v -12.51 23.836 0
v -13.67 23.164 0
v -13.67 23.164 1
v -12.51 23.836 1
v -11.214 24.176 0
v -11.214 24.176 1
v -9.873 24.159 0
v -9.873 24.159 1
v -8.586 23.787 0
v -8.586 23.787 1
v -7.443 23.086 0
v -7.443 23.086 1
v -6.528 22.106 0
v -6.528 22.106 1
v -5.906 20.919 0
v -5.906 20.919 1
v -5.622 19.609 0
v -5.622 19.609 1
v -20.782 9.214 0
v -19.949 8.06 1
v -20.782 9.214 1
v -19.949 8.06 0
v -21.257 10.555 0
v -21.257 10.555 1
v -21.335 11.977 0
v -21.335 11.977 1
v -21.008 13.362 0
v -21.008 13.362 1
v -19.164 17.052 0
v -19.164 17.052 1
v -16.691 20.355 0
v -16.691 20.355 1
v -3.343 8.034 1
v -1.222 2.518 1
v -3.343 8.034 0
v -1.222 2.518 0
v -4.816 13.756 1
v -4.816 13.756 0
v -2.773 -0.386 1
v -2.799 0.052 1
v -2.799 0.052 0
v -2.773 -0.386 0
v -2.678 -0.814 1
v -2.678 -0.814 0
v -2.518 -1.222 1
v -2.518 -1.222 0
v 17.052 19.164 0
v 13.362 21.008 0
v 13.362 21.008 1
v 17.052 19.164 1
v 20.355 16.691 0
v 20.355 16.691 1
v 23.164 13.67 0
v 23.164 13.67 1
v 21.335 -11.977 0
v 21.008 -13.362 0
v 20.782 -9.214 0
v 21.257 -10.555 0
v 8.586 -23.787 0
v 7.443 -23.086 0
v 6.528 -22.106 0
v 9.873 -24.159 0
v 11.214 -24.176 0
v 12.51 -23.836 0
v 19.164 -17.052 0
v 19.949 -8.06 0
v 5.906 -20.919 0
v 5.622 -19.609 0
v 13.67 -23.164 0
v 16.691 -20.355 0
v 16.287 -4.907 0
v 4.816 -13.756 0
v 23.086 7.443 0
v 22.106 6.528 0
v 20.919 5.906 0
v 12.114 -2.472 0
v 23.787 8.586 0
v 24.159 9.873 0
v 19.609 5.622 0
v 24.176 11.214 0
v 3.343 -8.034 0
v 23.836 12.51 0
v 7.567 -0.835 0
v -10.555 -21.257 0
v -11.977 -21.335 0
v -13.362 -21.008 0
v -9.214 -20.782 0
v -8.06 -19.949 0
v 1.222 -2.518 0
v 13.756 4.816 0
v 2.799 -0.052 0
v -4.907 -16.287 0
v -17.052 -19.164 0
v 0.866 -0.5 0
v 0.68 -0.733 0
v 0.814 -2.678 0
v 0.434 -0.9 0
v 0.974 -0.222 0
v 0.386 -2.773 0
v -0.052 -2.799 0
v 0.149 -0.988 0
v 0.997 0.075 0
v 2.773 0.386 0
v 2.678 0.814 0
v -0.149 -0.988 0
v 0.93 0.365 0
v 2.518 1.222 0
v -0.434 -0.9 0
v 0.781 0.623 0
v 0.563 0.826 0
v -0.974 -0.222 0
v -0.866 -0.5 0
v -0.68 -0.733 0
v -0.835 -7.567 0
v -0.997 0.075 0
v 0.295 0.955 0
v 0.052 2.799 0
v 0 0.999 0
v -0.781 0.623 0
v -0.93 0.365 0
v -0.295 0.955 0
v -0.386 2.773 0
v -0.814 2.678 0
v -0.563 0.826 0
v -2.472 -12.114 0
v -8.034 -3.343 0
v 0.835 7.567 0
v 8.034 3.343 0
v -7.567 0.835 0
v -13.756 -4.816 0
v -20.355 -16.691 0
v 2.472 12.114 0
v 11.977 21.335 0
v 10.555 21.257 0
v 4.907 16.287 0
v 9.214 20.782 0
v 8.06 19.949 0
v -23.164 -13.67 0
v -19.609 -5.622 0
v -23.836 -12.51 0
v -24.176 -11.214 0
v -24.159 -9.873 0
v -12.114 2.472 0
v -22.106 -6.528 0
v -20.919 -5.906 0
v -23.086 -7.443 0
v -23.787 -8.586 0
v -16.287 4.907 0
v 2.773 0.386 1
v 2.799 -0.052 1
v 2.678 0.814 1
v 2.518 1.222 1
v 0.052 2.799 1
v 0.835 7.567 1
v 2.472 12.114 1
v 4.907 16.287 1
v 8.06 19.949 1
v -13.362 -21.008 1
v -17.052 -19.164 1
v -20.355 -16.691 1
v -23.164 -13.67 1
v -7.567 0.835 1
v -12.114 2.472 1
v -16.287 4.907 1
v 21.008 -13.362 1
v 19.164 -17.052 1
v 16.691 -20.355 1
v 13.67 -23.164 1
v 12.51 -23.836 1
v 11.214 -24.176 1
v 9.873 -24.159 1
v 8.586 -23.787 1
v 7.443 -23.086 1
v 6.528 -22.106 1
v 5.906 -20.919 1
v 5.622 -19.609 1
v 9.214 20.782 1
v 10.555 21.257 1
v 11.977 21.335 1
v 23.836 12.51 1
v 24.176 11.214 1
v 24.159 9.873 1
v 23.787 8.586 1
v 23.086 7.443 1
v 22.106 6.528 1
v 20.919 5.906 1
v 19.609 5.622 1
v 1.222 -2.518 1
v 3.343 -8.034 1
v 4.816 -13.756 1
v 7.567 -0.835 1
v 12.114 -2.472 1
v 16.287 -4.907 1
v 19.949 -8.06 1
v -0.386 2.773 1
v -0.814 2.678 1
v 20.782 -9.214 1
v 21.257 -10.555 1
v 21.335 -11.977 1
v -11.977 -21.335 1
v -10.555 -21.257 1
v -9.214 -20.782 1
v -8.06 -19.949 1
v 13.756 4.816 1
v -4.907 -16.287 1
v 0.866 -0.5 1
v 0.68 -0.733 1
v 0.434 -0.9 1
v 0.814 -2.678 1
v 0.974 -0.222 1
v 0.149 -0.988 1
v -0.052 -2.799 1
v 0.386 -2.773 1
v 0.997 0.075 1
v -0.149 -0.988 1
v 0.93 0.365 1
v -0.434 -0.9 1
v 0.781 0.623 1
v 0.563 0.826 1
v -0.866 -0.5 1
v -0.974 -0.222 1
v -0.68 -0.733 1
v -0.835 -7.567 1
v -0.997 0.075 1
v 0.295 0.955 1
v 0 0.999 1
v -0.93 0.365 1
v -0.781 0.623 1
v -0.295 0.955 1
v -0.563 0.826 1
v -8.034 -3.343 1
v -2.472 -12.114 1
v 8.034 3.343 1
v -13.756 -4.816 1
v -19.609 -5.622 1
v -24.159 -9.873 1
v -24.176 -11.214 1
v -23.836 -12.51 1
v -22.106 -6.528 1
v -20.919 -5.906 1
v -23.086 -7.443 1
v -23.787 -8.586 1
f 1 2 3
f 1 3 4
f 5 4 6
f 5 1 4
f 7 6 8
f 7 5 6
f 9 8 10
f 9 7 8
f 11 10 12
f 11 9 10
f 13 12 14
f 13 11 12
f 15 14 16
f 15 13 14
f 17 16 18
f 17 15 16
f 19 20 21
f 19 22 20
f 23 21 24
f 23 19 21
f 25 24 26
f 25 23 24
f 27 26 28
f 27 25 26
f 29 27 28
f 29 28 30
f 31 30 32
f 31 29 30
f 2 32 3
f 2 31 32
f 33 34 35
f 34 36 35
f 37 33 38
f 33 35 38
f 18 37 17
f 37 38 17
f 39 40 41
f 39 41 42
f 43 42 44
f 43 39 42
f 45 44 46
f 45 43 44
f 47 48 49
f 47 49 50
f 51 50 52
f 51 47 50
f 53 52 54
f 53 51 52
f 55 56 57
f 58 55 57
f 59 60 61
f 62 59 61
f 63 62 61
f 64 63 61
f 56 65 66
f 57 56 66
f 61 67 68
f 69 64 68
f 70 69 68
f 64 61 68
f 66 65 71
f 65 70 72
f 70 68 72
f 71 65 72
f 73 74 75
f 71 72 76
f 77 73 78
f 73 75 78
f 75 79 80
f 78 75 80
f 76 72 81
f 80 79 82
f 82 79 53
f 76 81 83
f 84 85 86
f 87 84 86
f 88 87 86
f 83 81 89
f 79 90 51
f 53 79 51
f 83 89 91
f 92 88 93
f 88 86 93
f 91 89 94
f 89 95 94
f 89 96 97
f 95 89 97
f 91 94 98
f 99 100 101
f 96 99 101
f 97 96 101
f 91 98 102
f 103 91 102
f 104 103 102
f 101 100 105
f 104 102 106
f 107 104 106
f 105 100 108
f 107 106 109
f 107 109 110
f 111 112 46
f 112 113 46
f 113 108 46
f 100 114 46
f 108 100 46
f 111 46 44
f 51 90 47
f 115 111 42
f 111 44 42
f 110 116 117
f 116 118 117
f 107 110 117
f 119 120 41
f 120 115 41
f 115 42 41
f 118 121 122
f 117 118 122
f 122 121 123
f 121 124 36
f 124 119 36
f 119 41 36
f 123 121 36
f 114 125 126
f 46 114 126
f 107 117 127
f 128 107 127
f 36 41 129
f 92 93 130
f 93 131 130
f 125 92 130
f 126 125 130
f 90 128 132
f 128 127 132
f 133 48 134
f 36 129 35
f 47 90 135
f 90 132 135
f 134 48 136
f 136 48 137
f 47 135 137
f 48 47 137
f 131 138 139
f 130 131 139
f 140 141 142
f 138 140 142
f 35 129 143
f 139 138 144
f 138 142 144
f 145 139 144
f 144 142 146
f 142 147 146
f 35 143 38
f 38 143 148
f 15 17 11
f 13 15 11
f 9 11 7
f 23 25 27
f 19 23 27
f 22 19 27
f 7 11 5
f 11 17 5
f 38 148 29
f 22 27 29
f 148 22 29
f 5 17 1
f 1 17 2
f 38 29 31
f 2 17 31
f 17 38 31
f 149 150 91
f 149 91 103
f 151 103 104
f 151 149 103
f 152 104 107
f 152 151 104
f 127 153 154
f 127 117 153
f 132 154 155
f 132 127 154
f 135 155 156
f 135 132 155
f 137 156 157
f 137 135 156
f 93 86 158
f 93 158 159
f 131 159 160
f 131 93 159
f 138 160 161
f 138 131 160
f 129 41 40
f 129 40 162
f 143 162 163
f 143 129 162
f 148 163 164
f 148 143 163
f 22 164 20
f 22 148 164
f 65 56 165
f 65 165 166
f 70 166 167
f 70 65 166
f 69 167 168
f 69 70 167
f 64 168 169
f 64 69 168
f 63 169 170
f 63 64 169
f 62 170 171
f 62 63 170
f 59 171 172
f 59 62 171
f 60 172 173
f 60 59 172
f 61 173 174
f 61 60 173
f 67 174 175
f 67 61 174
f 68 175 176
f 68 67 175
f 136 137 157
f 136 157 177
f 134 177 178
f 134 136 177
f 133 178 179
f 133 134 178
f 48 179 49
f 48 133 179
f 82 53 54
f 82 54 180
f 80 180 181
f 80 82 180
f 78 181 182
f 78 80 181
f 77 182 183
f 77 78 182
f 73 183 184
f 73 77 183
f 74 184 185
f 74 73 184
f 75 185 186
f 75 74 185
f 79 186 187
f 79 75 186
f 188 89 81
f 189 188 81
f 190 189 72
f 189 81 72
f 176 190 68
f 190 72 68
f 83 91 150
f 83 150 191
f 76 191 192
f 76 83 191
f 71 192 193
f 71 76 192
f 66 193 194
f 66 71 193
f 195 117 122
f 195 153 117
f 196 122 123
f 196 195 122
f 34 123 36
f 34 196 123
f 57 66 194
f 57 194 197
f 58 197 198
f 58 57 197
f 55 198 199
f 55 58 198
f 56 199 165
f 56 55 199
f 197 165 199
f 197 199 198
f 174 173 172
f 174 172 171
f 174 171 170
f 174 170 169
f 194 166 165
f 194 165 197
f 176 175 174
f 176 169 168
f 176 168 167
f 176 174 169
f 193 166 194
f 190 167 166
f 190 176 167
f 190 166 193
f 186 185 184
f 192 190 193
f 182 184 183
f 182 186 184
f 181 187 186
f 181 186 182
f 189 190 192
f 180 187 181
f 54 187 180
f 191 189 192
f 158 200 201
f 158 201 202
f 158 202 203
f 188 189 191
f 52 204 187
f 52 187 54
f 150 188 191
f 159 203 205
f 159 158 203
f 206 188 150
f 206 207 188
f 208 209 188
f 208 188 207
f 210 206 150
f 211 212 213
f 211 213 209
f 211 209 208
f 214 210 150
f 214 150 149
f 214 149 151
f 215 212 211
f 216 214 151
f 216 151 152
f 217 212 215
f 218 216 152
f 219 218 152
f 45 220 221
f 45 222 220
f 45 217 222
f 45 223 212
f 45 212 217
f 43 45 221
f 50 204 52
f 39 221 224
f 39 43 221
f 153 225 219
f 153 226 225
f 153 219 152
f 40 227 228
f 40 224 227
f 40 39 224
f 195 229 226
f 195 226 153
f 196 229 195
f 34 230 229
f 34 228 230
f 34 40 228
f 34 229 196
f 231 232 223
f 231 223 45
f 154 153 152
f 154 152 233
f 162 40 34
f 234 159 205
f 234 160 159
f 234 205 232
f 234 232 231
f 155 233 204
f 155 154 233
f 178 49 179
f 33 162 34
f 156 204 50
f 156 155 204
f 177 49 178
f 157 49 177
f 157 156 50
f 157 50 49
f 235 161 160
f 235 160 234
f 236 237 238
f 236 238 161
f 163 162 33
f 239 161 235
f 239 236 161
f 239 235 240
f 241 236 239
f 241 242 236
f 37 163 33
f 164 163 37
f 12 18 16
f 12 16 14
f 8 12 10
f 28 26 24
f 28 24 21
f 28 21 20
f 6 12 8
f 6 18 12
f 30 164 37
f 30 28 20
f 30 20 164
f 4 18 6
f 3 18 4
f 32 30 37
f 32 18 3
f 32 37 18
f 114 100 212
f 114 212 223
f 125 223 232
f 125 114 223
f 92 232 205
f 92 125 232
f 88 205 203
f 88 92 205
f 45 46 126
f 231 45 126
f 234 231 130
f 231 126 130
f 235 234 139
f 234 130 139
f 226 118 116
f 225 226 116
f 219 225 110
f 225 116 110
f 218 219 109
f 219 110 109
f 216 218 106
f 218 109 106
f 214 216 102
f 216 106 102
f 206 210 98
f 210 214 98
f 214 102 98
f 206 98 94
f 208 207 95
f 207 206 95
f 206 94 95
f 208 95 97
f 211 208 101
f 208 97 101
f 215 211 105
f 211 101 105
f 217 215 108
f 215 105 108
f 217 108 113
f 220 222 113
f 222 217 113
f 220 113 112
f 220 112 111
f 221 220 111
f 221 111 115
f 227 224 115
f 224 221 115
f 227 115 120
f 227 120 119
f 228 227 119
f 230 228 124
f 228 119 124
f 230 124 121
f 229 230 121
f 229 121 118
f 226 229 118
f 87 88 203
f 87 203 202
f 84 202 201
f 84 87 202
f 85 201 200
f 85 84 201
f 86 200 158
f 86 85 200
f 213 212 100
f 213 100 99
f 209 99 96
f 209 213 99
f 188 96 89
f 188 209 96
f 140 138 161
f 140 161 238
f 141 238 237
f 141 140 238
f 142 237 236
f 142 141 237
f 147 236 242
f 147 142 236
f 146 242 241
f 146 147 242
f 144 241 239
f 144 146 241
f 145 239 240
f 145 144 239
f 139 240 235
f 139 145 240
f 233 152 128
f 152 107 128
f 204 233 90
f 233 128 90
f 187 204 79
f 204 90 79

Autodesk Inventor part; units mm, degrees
ref_plane "YZ Plane" through (0, 0, 0) normal (1, 0, 0) x (0, 1, 0)
ref_plane "XZ Plane" through (0, 0, 0) normal (0, 1, 0) x (-1, 0, 0)
ref_plane "XY Plane" through (0, 0, 0) normal (0, 0, 1) x (1, 0, 0)
sketch "Sketch1" plane through (0, 0, 0) normal (0, 0, 1) x (1, 0, 0)
  circle A0 centre (0, 0) radius 28
  circle A1 centre (0, 0) radius 1.8
  arc A2 (23.4652, 15.2769) -> (5.1796, 27.5168) centre (0, 0) ccw
  arc A3 (1.1742, 1.3642) -> (0.0115, 1.8) centre (0, 0) ccw
  arc A4 (1.3642, -1.1742) -> (1.8, -0.0115) centre (0, 0) ccw
  arc A5 (-1.3642, 1.1742) -> (-1.8, 0.0115) centre (0, 0) ccw
  arc A6 (-1.1742, -1.3642) -> (-0.0115, -1.8) centre (0, 0) ccw
  arc A7 (8.0598, 19.9487) -> (-0.0006, 1.8) centre (26.4682, 0.9087) ccw
  arc A8 (23.1644, 13.6701) -> (13.3624, 21.0083) centre (4.9305, -0.4702) ccw
  arc A9 (19.6092, 5.6217) -> (1.6116, 0.8017) centre (23.6763, -45.5755) ccw
  arc A10 (1.6116, 0.8017) -> (-0.0006, 1.8) centre (0, 0) ccw
  arc A11 (13.3624, 21.0083) -> (8.0598, 19.9487) centre (11.5352, 16.3541) ccw
  arc A12 (19.6092, 5.6217) -> (23.1644, 13.6701) centre (19.2133, 10.606) ccw
  arc A13 (19.9487, -8.0598) -> (1.8, 0.0006) centre (0.9087, -26.4682) ccw
  arc A14 (13.6701, -23.1644) -> (21.0083, -13.3624) centre (-0.4702, -4.9305) ccw
  arc A15 (5.6217, -19.6092) -> (0.8017, -1.6116) centre (-45.5755, -23.6763) ccw
  arc A16 (0.8017, -1.6116) -> (1.8, 0.0006) centre (0, 0) ccw
  arc A17 (21.0083, -13.3624) -> (19.9487, -8.0598) centre (16.3541, -11.5352) ccw
  arc A18 (5.6217, -19.6092) -> (13.6701, -23.1644) centre (10.606, -19.2133) ccw
  arc A19 (-1.1742, -1.3642) -> (-0.0115, -1.8) centre (0, 0) ccw
  arc A20 (-8.0598, -19.9487) -> (0.0006, -1.8) centre (-26.4682, -0.9087) ccw
  arc A21 (-23.1644, -13.6701) -> (-13.3624, -21.0083) centre (-4.9305, 0.4702) ccw
  arc A22 (-19.6092, -5.6217) -> (-23.1644, -13.6701) centre (-19.2133, -10.606) ccw
  arc A23 (-13.3624, -21.0083) -> (-8.0598, -19.9487) centre (-11.5352, -16.3541) ccw
  arc A24 (-19.6092, -5.6217) -> (-1.6116, -0.8017) centre (-23.6763, 45.5755) ccw
  arc A25 (-1.6116, -0.8017) -> (0.0006, -1.8) centre (0, 0) ccw
  arc A26 (-19.9487, 8.0598) -> (-1.8, -0.0006) centre (-0.9087, 26.4682) ccw
  arc A27 (-21.0083, 13.3624) -> (-19.9487, 8.0598) centre (-16.3541, 11.5352) ccw
  arc A28 (-5.6217, 19.6092) -> (-0.8017, 1.6116) centre (45.5755, 23.6763) ccw
  arc A29 (-13.6701, 23.1644) -> (-21.0083, 13.3624) centre (0.4702, 4.9305) ccw
  arc A30 (-5.6217, 19.6092) -> (-13.6701, 23.1644) centre (-10.606, 19.2133) ccw
  arc A31 (-0.8017, 1.6116) -> (-1.8, -0.0006) centre (0, 0) ccw
  circle A32 centre (0, 0) radius 1
  point P0 (0.0006, -1.8)
  point P1 (-1.6116, -0.8017)
  point P2 (-1.8, -0.0006)
  point P3 (-0.8017, 1.6116)
  point P4 (1.8, 0.0006)
  point P5 (0.8017, -1.6116)
  dimension "d2" = 5
  dimension "d3" = 5
  dimension "d4" = 5
  dimension "d5" = 5
  dimension "d6" = 5
  dimension "d7" = 5
  dimension "d8" = 5
  dimension "d9" = 5
  dimension "d15" = 3.6
  dimension "d16" = 2
extrude "Extrusion1" add sketch "Sketch1" along normal blind 1 contours A13 A17 A14 A18 A15 A1 | A1 A7 A11 A8 A12 A9 | A20 A23 A21 A22 A24 A1 | A1 A26 A27 A29 A30 A28
sketch "Sketch2" plane through (0, 0, 0) normal (1, 0, 0) x (0, 1, 0)
  line L0 (0.9994, 0) -> (2.7994, 0)
  line L1 (2.7994, 0) -> (2.7994, 1)
  line L2 (2.7994, 1) -> (0.9994, 1)
  line L3 (0.9994, 1) -> (0.9994, 0)
  line L4 (0, -0.2) -> (0, 1.2) projected
  point P0 (0, 0)
  dimension "d12" = 1.8
  dimension "d13" = 1
revolve "Revolution1" add sketch "Sketch2" angle 360 about axis through (0, 0, -10) along (0, 0, 1)
properties part number "blades"
